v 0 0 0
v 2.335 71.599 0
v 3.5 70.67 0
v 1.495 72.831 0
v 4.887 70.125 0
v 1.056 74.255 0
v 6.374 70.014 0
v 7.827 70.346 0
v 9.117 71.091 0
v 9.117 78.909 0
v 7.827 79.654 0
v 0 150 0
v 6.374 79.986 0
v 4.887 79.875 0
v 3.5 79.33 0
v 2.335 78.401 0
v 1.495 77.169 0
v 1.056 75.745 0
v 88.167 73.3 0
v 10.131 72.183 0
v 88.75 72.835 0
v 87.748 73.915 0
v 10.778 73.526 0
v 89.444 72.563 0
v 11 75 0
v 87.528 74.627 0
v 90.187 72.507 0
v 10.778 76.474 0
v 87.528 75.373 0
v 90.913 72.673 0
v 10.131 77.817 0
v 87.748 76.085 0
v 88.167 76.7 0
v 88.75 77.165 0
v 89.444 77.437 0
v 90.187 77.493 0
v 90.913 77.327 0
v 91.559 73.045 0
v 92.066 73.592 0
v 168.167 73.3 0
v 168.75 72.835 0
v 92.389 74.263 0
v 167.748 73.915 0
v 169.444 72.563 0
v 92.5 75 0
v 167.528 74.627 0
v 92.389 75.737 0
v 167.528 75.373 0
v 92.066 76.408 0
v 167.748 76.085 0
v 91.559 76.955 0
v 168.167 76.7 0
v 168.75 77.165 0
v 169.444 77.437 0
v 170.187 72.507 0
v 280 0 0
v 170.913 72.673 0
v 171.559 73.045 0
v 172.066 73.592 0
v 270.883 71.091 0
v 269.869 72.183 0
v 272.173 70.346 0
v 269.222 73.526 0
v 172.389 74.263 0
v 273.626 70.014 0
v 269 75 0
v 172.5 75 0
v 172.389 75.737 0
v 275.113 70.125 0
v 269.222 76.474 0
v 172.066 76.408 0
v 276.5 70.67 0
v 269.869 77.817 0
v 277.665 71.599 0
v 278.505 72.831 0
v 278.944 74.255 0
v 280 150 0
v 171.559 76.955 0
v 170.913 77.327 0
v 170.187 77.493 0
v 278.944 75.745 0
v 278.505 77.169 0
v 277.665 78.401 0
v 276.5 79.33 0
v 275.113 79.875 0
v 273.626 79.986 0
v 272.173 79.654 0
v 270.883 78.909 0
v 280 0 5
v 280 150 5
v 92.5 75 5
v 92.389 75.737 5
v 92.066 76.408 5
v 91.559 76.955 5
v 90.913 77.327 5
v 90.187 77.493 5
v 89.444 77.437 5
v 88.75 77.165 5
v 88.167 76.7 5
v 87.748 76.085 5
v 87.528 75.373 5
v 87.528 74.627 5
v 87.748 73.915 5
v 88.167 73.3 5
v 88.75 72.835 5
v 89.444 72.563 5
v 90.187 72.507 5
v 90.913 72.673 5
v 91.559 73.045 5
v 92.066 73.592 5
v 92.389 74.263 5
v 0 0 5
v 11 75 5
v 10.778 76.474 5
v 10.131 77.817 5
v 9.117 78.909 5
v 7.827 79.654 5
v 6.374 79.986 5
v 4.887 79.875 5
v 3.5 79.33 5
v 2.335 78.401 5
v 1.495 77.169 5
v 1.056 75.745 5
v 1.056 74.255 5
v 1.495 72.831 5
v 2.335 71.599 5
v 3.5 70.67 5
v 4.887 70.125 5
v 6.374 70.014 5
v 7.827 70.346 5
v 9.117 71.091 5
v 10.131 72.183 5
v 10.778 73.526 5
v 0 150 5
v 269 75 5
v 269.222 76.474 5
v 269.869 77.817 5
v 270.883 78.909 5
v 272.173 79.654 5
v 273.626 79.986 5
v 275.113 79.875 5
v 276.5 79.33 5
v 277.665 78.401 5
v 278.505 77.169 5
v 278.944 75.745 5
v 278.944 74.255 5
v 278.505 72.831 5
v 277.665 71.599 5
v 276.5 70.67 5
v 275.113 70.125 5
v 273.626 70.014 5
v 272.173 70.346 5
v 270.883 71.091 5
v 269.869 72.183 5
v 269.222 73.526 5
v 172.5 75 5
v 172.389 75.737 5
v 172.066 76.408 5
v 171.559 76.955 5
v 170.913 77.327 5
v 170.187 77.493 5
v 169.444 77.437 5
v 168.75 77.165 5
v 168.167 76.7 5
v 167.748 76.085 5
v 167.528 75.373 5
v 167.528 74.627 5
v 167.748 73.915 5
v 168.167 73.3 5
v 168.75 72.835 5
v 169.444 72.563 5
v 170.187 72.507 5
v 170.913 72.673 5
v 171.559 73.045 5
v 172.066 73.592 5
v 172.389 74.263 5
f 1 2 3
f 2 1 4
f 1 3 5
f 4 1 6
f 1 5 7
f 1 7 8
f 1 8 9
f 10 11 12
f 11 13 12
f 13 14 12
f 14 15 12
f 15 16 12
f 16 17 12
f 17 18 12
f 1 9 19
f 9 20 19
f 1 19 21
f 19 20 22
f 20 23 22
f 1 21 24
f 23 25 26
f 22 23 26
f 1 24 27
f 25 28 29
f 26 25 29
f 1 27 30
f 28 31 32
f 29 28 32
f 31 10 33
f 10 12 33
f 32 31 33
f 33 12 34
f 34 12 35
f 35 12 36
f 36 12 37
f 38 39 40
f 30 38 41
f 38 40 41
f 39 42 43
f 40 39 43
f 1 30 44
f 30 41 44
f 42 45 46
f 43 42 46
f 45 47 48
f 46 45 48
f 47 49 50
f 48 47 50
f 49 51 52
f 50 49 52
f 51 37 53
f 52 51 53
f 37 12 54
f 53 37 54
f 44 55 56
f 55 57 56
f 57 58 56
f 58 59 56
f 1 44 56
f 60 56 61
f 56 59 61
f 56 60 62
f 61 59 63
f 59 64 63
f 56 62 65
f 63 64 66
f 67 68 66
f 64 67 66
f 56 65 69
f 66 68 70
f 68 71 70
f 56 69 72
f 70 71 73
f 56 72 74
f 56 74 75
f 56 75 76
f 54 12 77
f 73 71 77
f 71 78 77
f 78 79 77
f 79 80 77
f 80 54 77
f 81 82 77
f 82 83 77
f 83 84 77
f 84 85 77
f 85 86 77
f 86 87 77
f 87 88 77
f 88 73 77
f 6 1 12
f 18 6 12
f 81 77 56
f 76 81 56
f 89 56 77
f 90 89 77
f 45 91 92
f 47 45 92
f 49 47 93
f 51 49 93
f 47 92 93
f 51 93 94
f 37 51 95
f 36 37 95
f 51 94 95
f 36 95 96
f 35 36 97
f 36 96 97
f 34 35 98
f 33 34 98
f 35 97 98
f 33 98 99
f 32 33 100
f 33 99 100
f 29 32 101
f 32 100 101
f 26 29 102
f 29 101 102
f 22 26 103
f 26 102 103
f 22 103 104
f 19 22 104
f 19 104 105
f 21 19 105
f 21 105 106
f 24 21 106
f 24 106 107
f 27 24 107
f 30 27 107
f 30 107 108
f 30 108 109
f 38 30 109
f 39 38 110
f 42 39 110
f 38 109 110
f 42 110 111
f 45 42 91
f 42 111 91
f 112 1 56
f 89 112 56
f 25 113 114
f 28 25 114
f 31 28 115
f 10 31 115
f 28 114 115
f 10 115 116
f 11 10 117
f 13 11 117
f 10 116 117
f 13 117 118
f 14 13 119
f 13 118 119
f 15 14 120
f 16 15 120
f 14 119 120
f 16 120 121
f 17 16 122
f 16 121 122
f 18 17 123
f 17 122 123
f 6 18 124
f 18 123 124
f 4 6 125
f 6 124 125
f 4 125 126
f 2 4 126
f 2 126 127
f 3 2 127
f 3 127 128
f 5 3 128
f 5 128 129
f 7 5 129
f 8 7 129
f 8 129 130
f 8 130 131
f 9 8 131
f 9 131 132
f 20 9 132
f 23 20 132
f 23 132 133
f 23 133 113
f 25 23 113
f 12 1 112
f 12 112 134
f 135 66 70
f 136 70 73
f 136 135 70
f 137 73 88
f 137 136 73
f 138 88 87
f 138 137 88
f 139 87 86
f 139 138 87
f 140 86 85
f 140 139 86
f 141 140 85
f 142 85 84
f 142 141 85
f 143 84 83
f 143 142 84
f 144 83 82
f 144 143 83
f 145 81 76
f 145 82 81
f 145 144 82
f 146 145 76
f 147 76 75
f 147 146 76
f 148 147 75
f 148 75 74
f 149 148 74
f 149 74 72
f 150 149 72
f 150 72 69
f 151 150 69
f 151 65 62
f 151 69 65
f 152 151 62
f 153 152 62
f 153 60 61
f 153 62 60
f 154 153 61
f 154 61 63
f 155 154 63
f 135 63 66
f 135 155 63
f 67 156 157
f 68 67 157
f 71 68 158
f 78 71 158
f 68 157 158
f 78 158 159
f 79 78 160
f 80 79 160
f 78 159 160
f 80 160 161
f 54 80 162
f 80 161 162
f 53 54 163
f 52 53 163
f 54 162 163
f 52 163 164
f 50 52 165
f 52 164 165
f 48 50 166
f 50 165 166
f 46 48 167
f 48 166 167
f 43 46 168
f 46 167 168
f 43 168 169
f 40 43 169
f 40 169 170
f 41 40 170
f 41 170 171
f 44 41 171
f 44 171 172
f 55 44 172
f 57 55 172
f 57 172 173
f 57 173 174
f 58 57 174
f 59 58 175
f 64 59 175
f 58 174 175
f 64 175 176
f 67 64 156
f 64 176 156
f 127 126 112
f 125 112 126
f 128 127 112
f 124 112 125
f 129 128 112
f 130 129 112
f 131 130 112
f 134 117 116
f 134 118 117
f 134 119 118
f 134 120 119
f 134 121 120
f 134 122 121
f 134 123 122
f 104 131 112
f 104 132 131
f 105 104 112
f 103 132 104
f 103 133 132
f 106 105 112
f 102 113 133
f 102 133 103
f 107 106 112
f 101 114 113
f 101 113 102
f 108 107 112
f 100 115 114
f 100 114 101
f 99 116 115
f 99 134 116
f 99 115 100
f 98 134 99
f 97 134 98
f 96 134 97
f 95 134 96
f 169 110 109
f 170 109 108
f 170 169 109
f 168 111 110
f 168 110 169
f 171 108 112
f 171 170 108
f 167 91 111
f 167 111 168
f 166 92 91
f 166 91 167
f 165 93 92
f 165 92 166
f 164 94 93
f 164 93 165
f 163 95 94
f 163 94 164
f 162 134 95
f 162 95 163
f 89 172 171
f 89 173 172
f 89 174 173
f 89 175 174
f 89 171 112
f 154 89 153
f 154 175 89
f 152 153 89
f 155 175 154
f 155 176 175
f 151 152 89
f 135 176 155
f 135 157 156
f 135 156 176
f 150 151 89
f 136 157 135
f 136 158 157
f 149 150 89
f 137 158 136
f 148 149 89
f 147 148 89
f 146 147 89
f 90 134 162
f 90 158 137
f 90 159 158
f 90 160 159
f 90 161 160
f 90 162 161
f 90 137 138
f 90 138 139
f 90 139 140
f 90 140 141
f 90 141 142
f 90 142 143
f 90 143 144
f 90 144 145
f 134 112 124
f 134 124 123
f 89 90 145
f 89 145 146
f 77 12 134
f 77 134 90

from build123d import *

# Parameters (mm, degrees)
ESQUISSE1_W             = 280
ESQUISSE1_H             = 150
BOSS_EXTRU_1_DEPTH      = 5
ESQUISSE2_R             = 2.5
ENL_V_MAT_EXTRU_1_DEPTH = 5
ESQUISSE3_R             = 5
ENL_V_MAT_EXTRU_2_DEPTH = 6


with BuildPart() as part:
    # Esquisse1 → Boss.-Extru.1 (new body)
    with BuildSketch(Plane.XY):
        with Locations((140, 75)):
            Rectangle(ESQUISSE1_W, ESQUISSE1_H)
    extrude(amount=BOSS_EXTRU_1_DEPTH)

    # Esquisse2 → Enlèv. mat.-Extru.1 (cut)
    with BuildSketch(Plane.XY.offset(5)):
        with Locations((90, 75)):
            Circle(ESQUISSE2_R)
        with Locations((170, 75)):
            Circle(ESQUISSE2_R)
    extrude(amount=-ENL_V_MAT_EXTRU_1_DEPTH, mode=Mode.SUBTRACT)

    # Esquisse3 → Enlèv. mat.-Extru.2 (cut, through all)
    with BuildSketch(Plane.XY.offset(5)):
        with Locations((6, 75)):
            Circle(ESQUISSE3_R)
    enl_v_mat_extru_2 = extrude(amount=-ENL_V_MAT_EXTRU_2_DEPTH, mode=Mode.SUBTRACT)

    # Symétrie1: Enlèv. mat.-Extru.2 across plane
    add(enl_v_mat_extru_2.mirror(Plane.ZY.offset(-140)), mode=Mode.SUBTRACT)


solid = part.part
